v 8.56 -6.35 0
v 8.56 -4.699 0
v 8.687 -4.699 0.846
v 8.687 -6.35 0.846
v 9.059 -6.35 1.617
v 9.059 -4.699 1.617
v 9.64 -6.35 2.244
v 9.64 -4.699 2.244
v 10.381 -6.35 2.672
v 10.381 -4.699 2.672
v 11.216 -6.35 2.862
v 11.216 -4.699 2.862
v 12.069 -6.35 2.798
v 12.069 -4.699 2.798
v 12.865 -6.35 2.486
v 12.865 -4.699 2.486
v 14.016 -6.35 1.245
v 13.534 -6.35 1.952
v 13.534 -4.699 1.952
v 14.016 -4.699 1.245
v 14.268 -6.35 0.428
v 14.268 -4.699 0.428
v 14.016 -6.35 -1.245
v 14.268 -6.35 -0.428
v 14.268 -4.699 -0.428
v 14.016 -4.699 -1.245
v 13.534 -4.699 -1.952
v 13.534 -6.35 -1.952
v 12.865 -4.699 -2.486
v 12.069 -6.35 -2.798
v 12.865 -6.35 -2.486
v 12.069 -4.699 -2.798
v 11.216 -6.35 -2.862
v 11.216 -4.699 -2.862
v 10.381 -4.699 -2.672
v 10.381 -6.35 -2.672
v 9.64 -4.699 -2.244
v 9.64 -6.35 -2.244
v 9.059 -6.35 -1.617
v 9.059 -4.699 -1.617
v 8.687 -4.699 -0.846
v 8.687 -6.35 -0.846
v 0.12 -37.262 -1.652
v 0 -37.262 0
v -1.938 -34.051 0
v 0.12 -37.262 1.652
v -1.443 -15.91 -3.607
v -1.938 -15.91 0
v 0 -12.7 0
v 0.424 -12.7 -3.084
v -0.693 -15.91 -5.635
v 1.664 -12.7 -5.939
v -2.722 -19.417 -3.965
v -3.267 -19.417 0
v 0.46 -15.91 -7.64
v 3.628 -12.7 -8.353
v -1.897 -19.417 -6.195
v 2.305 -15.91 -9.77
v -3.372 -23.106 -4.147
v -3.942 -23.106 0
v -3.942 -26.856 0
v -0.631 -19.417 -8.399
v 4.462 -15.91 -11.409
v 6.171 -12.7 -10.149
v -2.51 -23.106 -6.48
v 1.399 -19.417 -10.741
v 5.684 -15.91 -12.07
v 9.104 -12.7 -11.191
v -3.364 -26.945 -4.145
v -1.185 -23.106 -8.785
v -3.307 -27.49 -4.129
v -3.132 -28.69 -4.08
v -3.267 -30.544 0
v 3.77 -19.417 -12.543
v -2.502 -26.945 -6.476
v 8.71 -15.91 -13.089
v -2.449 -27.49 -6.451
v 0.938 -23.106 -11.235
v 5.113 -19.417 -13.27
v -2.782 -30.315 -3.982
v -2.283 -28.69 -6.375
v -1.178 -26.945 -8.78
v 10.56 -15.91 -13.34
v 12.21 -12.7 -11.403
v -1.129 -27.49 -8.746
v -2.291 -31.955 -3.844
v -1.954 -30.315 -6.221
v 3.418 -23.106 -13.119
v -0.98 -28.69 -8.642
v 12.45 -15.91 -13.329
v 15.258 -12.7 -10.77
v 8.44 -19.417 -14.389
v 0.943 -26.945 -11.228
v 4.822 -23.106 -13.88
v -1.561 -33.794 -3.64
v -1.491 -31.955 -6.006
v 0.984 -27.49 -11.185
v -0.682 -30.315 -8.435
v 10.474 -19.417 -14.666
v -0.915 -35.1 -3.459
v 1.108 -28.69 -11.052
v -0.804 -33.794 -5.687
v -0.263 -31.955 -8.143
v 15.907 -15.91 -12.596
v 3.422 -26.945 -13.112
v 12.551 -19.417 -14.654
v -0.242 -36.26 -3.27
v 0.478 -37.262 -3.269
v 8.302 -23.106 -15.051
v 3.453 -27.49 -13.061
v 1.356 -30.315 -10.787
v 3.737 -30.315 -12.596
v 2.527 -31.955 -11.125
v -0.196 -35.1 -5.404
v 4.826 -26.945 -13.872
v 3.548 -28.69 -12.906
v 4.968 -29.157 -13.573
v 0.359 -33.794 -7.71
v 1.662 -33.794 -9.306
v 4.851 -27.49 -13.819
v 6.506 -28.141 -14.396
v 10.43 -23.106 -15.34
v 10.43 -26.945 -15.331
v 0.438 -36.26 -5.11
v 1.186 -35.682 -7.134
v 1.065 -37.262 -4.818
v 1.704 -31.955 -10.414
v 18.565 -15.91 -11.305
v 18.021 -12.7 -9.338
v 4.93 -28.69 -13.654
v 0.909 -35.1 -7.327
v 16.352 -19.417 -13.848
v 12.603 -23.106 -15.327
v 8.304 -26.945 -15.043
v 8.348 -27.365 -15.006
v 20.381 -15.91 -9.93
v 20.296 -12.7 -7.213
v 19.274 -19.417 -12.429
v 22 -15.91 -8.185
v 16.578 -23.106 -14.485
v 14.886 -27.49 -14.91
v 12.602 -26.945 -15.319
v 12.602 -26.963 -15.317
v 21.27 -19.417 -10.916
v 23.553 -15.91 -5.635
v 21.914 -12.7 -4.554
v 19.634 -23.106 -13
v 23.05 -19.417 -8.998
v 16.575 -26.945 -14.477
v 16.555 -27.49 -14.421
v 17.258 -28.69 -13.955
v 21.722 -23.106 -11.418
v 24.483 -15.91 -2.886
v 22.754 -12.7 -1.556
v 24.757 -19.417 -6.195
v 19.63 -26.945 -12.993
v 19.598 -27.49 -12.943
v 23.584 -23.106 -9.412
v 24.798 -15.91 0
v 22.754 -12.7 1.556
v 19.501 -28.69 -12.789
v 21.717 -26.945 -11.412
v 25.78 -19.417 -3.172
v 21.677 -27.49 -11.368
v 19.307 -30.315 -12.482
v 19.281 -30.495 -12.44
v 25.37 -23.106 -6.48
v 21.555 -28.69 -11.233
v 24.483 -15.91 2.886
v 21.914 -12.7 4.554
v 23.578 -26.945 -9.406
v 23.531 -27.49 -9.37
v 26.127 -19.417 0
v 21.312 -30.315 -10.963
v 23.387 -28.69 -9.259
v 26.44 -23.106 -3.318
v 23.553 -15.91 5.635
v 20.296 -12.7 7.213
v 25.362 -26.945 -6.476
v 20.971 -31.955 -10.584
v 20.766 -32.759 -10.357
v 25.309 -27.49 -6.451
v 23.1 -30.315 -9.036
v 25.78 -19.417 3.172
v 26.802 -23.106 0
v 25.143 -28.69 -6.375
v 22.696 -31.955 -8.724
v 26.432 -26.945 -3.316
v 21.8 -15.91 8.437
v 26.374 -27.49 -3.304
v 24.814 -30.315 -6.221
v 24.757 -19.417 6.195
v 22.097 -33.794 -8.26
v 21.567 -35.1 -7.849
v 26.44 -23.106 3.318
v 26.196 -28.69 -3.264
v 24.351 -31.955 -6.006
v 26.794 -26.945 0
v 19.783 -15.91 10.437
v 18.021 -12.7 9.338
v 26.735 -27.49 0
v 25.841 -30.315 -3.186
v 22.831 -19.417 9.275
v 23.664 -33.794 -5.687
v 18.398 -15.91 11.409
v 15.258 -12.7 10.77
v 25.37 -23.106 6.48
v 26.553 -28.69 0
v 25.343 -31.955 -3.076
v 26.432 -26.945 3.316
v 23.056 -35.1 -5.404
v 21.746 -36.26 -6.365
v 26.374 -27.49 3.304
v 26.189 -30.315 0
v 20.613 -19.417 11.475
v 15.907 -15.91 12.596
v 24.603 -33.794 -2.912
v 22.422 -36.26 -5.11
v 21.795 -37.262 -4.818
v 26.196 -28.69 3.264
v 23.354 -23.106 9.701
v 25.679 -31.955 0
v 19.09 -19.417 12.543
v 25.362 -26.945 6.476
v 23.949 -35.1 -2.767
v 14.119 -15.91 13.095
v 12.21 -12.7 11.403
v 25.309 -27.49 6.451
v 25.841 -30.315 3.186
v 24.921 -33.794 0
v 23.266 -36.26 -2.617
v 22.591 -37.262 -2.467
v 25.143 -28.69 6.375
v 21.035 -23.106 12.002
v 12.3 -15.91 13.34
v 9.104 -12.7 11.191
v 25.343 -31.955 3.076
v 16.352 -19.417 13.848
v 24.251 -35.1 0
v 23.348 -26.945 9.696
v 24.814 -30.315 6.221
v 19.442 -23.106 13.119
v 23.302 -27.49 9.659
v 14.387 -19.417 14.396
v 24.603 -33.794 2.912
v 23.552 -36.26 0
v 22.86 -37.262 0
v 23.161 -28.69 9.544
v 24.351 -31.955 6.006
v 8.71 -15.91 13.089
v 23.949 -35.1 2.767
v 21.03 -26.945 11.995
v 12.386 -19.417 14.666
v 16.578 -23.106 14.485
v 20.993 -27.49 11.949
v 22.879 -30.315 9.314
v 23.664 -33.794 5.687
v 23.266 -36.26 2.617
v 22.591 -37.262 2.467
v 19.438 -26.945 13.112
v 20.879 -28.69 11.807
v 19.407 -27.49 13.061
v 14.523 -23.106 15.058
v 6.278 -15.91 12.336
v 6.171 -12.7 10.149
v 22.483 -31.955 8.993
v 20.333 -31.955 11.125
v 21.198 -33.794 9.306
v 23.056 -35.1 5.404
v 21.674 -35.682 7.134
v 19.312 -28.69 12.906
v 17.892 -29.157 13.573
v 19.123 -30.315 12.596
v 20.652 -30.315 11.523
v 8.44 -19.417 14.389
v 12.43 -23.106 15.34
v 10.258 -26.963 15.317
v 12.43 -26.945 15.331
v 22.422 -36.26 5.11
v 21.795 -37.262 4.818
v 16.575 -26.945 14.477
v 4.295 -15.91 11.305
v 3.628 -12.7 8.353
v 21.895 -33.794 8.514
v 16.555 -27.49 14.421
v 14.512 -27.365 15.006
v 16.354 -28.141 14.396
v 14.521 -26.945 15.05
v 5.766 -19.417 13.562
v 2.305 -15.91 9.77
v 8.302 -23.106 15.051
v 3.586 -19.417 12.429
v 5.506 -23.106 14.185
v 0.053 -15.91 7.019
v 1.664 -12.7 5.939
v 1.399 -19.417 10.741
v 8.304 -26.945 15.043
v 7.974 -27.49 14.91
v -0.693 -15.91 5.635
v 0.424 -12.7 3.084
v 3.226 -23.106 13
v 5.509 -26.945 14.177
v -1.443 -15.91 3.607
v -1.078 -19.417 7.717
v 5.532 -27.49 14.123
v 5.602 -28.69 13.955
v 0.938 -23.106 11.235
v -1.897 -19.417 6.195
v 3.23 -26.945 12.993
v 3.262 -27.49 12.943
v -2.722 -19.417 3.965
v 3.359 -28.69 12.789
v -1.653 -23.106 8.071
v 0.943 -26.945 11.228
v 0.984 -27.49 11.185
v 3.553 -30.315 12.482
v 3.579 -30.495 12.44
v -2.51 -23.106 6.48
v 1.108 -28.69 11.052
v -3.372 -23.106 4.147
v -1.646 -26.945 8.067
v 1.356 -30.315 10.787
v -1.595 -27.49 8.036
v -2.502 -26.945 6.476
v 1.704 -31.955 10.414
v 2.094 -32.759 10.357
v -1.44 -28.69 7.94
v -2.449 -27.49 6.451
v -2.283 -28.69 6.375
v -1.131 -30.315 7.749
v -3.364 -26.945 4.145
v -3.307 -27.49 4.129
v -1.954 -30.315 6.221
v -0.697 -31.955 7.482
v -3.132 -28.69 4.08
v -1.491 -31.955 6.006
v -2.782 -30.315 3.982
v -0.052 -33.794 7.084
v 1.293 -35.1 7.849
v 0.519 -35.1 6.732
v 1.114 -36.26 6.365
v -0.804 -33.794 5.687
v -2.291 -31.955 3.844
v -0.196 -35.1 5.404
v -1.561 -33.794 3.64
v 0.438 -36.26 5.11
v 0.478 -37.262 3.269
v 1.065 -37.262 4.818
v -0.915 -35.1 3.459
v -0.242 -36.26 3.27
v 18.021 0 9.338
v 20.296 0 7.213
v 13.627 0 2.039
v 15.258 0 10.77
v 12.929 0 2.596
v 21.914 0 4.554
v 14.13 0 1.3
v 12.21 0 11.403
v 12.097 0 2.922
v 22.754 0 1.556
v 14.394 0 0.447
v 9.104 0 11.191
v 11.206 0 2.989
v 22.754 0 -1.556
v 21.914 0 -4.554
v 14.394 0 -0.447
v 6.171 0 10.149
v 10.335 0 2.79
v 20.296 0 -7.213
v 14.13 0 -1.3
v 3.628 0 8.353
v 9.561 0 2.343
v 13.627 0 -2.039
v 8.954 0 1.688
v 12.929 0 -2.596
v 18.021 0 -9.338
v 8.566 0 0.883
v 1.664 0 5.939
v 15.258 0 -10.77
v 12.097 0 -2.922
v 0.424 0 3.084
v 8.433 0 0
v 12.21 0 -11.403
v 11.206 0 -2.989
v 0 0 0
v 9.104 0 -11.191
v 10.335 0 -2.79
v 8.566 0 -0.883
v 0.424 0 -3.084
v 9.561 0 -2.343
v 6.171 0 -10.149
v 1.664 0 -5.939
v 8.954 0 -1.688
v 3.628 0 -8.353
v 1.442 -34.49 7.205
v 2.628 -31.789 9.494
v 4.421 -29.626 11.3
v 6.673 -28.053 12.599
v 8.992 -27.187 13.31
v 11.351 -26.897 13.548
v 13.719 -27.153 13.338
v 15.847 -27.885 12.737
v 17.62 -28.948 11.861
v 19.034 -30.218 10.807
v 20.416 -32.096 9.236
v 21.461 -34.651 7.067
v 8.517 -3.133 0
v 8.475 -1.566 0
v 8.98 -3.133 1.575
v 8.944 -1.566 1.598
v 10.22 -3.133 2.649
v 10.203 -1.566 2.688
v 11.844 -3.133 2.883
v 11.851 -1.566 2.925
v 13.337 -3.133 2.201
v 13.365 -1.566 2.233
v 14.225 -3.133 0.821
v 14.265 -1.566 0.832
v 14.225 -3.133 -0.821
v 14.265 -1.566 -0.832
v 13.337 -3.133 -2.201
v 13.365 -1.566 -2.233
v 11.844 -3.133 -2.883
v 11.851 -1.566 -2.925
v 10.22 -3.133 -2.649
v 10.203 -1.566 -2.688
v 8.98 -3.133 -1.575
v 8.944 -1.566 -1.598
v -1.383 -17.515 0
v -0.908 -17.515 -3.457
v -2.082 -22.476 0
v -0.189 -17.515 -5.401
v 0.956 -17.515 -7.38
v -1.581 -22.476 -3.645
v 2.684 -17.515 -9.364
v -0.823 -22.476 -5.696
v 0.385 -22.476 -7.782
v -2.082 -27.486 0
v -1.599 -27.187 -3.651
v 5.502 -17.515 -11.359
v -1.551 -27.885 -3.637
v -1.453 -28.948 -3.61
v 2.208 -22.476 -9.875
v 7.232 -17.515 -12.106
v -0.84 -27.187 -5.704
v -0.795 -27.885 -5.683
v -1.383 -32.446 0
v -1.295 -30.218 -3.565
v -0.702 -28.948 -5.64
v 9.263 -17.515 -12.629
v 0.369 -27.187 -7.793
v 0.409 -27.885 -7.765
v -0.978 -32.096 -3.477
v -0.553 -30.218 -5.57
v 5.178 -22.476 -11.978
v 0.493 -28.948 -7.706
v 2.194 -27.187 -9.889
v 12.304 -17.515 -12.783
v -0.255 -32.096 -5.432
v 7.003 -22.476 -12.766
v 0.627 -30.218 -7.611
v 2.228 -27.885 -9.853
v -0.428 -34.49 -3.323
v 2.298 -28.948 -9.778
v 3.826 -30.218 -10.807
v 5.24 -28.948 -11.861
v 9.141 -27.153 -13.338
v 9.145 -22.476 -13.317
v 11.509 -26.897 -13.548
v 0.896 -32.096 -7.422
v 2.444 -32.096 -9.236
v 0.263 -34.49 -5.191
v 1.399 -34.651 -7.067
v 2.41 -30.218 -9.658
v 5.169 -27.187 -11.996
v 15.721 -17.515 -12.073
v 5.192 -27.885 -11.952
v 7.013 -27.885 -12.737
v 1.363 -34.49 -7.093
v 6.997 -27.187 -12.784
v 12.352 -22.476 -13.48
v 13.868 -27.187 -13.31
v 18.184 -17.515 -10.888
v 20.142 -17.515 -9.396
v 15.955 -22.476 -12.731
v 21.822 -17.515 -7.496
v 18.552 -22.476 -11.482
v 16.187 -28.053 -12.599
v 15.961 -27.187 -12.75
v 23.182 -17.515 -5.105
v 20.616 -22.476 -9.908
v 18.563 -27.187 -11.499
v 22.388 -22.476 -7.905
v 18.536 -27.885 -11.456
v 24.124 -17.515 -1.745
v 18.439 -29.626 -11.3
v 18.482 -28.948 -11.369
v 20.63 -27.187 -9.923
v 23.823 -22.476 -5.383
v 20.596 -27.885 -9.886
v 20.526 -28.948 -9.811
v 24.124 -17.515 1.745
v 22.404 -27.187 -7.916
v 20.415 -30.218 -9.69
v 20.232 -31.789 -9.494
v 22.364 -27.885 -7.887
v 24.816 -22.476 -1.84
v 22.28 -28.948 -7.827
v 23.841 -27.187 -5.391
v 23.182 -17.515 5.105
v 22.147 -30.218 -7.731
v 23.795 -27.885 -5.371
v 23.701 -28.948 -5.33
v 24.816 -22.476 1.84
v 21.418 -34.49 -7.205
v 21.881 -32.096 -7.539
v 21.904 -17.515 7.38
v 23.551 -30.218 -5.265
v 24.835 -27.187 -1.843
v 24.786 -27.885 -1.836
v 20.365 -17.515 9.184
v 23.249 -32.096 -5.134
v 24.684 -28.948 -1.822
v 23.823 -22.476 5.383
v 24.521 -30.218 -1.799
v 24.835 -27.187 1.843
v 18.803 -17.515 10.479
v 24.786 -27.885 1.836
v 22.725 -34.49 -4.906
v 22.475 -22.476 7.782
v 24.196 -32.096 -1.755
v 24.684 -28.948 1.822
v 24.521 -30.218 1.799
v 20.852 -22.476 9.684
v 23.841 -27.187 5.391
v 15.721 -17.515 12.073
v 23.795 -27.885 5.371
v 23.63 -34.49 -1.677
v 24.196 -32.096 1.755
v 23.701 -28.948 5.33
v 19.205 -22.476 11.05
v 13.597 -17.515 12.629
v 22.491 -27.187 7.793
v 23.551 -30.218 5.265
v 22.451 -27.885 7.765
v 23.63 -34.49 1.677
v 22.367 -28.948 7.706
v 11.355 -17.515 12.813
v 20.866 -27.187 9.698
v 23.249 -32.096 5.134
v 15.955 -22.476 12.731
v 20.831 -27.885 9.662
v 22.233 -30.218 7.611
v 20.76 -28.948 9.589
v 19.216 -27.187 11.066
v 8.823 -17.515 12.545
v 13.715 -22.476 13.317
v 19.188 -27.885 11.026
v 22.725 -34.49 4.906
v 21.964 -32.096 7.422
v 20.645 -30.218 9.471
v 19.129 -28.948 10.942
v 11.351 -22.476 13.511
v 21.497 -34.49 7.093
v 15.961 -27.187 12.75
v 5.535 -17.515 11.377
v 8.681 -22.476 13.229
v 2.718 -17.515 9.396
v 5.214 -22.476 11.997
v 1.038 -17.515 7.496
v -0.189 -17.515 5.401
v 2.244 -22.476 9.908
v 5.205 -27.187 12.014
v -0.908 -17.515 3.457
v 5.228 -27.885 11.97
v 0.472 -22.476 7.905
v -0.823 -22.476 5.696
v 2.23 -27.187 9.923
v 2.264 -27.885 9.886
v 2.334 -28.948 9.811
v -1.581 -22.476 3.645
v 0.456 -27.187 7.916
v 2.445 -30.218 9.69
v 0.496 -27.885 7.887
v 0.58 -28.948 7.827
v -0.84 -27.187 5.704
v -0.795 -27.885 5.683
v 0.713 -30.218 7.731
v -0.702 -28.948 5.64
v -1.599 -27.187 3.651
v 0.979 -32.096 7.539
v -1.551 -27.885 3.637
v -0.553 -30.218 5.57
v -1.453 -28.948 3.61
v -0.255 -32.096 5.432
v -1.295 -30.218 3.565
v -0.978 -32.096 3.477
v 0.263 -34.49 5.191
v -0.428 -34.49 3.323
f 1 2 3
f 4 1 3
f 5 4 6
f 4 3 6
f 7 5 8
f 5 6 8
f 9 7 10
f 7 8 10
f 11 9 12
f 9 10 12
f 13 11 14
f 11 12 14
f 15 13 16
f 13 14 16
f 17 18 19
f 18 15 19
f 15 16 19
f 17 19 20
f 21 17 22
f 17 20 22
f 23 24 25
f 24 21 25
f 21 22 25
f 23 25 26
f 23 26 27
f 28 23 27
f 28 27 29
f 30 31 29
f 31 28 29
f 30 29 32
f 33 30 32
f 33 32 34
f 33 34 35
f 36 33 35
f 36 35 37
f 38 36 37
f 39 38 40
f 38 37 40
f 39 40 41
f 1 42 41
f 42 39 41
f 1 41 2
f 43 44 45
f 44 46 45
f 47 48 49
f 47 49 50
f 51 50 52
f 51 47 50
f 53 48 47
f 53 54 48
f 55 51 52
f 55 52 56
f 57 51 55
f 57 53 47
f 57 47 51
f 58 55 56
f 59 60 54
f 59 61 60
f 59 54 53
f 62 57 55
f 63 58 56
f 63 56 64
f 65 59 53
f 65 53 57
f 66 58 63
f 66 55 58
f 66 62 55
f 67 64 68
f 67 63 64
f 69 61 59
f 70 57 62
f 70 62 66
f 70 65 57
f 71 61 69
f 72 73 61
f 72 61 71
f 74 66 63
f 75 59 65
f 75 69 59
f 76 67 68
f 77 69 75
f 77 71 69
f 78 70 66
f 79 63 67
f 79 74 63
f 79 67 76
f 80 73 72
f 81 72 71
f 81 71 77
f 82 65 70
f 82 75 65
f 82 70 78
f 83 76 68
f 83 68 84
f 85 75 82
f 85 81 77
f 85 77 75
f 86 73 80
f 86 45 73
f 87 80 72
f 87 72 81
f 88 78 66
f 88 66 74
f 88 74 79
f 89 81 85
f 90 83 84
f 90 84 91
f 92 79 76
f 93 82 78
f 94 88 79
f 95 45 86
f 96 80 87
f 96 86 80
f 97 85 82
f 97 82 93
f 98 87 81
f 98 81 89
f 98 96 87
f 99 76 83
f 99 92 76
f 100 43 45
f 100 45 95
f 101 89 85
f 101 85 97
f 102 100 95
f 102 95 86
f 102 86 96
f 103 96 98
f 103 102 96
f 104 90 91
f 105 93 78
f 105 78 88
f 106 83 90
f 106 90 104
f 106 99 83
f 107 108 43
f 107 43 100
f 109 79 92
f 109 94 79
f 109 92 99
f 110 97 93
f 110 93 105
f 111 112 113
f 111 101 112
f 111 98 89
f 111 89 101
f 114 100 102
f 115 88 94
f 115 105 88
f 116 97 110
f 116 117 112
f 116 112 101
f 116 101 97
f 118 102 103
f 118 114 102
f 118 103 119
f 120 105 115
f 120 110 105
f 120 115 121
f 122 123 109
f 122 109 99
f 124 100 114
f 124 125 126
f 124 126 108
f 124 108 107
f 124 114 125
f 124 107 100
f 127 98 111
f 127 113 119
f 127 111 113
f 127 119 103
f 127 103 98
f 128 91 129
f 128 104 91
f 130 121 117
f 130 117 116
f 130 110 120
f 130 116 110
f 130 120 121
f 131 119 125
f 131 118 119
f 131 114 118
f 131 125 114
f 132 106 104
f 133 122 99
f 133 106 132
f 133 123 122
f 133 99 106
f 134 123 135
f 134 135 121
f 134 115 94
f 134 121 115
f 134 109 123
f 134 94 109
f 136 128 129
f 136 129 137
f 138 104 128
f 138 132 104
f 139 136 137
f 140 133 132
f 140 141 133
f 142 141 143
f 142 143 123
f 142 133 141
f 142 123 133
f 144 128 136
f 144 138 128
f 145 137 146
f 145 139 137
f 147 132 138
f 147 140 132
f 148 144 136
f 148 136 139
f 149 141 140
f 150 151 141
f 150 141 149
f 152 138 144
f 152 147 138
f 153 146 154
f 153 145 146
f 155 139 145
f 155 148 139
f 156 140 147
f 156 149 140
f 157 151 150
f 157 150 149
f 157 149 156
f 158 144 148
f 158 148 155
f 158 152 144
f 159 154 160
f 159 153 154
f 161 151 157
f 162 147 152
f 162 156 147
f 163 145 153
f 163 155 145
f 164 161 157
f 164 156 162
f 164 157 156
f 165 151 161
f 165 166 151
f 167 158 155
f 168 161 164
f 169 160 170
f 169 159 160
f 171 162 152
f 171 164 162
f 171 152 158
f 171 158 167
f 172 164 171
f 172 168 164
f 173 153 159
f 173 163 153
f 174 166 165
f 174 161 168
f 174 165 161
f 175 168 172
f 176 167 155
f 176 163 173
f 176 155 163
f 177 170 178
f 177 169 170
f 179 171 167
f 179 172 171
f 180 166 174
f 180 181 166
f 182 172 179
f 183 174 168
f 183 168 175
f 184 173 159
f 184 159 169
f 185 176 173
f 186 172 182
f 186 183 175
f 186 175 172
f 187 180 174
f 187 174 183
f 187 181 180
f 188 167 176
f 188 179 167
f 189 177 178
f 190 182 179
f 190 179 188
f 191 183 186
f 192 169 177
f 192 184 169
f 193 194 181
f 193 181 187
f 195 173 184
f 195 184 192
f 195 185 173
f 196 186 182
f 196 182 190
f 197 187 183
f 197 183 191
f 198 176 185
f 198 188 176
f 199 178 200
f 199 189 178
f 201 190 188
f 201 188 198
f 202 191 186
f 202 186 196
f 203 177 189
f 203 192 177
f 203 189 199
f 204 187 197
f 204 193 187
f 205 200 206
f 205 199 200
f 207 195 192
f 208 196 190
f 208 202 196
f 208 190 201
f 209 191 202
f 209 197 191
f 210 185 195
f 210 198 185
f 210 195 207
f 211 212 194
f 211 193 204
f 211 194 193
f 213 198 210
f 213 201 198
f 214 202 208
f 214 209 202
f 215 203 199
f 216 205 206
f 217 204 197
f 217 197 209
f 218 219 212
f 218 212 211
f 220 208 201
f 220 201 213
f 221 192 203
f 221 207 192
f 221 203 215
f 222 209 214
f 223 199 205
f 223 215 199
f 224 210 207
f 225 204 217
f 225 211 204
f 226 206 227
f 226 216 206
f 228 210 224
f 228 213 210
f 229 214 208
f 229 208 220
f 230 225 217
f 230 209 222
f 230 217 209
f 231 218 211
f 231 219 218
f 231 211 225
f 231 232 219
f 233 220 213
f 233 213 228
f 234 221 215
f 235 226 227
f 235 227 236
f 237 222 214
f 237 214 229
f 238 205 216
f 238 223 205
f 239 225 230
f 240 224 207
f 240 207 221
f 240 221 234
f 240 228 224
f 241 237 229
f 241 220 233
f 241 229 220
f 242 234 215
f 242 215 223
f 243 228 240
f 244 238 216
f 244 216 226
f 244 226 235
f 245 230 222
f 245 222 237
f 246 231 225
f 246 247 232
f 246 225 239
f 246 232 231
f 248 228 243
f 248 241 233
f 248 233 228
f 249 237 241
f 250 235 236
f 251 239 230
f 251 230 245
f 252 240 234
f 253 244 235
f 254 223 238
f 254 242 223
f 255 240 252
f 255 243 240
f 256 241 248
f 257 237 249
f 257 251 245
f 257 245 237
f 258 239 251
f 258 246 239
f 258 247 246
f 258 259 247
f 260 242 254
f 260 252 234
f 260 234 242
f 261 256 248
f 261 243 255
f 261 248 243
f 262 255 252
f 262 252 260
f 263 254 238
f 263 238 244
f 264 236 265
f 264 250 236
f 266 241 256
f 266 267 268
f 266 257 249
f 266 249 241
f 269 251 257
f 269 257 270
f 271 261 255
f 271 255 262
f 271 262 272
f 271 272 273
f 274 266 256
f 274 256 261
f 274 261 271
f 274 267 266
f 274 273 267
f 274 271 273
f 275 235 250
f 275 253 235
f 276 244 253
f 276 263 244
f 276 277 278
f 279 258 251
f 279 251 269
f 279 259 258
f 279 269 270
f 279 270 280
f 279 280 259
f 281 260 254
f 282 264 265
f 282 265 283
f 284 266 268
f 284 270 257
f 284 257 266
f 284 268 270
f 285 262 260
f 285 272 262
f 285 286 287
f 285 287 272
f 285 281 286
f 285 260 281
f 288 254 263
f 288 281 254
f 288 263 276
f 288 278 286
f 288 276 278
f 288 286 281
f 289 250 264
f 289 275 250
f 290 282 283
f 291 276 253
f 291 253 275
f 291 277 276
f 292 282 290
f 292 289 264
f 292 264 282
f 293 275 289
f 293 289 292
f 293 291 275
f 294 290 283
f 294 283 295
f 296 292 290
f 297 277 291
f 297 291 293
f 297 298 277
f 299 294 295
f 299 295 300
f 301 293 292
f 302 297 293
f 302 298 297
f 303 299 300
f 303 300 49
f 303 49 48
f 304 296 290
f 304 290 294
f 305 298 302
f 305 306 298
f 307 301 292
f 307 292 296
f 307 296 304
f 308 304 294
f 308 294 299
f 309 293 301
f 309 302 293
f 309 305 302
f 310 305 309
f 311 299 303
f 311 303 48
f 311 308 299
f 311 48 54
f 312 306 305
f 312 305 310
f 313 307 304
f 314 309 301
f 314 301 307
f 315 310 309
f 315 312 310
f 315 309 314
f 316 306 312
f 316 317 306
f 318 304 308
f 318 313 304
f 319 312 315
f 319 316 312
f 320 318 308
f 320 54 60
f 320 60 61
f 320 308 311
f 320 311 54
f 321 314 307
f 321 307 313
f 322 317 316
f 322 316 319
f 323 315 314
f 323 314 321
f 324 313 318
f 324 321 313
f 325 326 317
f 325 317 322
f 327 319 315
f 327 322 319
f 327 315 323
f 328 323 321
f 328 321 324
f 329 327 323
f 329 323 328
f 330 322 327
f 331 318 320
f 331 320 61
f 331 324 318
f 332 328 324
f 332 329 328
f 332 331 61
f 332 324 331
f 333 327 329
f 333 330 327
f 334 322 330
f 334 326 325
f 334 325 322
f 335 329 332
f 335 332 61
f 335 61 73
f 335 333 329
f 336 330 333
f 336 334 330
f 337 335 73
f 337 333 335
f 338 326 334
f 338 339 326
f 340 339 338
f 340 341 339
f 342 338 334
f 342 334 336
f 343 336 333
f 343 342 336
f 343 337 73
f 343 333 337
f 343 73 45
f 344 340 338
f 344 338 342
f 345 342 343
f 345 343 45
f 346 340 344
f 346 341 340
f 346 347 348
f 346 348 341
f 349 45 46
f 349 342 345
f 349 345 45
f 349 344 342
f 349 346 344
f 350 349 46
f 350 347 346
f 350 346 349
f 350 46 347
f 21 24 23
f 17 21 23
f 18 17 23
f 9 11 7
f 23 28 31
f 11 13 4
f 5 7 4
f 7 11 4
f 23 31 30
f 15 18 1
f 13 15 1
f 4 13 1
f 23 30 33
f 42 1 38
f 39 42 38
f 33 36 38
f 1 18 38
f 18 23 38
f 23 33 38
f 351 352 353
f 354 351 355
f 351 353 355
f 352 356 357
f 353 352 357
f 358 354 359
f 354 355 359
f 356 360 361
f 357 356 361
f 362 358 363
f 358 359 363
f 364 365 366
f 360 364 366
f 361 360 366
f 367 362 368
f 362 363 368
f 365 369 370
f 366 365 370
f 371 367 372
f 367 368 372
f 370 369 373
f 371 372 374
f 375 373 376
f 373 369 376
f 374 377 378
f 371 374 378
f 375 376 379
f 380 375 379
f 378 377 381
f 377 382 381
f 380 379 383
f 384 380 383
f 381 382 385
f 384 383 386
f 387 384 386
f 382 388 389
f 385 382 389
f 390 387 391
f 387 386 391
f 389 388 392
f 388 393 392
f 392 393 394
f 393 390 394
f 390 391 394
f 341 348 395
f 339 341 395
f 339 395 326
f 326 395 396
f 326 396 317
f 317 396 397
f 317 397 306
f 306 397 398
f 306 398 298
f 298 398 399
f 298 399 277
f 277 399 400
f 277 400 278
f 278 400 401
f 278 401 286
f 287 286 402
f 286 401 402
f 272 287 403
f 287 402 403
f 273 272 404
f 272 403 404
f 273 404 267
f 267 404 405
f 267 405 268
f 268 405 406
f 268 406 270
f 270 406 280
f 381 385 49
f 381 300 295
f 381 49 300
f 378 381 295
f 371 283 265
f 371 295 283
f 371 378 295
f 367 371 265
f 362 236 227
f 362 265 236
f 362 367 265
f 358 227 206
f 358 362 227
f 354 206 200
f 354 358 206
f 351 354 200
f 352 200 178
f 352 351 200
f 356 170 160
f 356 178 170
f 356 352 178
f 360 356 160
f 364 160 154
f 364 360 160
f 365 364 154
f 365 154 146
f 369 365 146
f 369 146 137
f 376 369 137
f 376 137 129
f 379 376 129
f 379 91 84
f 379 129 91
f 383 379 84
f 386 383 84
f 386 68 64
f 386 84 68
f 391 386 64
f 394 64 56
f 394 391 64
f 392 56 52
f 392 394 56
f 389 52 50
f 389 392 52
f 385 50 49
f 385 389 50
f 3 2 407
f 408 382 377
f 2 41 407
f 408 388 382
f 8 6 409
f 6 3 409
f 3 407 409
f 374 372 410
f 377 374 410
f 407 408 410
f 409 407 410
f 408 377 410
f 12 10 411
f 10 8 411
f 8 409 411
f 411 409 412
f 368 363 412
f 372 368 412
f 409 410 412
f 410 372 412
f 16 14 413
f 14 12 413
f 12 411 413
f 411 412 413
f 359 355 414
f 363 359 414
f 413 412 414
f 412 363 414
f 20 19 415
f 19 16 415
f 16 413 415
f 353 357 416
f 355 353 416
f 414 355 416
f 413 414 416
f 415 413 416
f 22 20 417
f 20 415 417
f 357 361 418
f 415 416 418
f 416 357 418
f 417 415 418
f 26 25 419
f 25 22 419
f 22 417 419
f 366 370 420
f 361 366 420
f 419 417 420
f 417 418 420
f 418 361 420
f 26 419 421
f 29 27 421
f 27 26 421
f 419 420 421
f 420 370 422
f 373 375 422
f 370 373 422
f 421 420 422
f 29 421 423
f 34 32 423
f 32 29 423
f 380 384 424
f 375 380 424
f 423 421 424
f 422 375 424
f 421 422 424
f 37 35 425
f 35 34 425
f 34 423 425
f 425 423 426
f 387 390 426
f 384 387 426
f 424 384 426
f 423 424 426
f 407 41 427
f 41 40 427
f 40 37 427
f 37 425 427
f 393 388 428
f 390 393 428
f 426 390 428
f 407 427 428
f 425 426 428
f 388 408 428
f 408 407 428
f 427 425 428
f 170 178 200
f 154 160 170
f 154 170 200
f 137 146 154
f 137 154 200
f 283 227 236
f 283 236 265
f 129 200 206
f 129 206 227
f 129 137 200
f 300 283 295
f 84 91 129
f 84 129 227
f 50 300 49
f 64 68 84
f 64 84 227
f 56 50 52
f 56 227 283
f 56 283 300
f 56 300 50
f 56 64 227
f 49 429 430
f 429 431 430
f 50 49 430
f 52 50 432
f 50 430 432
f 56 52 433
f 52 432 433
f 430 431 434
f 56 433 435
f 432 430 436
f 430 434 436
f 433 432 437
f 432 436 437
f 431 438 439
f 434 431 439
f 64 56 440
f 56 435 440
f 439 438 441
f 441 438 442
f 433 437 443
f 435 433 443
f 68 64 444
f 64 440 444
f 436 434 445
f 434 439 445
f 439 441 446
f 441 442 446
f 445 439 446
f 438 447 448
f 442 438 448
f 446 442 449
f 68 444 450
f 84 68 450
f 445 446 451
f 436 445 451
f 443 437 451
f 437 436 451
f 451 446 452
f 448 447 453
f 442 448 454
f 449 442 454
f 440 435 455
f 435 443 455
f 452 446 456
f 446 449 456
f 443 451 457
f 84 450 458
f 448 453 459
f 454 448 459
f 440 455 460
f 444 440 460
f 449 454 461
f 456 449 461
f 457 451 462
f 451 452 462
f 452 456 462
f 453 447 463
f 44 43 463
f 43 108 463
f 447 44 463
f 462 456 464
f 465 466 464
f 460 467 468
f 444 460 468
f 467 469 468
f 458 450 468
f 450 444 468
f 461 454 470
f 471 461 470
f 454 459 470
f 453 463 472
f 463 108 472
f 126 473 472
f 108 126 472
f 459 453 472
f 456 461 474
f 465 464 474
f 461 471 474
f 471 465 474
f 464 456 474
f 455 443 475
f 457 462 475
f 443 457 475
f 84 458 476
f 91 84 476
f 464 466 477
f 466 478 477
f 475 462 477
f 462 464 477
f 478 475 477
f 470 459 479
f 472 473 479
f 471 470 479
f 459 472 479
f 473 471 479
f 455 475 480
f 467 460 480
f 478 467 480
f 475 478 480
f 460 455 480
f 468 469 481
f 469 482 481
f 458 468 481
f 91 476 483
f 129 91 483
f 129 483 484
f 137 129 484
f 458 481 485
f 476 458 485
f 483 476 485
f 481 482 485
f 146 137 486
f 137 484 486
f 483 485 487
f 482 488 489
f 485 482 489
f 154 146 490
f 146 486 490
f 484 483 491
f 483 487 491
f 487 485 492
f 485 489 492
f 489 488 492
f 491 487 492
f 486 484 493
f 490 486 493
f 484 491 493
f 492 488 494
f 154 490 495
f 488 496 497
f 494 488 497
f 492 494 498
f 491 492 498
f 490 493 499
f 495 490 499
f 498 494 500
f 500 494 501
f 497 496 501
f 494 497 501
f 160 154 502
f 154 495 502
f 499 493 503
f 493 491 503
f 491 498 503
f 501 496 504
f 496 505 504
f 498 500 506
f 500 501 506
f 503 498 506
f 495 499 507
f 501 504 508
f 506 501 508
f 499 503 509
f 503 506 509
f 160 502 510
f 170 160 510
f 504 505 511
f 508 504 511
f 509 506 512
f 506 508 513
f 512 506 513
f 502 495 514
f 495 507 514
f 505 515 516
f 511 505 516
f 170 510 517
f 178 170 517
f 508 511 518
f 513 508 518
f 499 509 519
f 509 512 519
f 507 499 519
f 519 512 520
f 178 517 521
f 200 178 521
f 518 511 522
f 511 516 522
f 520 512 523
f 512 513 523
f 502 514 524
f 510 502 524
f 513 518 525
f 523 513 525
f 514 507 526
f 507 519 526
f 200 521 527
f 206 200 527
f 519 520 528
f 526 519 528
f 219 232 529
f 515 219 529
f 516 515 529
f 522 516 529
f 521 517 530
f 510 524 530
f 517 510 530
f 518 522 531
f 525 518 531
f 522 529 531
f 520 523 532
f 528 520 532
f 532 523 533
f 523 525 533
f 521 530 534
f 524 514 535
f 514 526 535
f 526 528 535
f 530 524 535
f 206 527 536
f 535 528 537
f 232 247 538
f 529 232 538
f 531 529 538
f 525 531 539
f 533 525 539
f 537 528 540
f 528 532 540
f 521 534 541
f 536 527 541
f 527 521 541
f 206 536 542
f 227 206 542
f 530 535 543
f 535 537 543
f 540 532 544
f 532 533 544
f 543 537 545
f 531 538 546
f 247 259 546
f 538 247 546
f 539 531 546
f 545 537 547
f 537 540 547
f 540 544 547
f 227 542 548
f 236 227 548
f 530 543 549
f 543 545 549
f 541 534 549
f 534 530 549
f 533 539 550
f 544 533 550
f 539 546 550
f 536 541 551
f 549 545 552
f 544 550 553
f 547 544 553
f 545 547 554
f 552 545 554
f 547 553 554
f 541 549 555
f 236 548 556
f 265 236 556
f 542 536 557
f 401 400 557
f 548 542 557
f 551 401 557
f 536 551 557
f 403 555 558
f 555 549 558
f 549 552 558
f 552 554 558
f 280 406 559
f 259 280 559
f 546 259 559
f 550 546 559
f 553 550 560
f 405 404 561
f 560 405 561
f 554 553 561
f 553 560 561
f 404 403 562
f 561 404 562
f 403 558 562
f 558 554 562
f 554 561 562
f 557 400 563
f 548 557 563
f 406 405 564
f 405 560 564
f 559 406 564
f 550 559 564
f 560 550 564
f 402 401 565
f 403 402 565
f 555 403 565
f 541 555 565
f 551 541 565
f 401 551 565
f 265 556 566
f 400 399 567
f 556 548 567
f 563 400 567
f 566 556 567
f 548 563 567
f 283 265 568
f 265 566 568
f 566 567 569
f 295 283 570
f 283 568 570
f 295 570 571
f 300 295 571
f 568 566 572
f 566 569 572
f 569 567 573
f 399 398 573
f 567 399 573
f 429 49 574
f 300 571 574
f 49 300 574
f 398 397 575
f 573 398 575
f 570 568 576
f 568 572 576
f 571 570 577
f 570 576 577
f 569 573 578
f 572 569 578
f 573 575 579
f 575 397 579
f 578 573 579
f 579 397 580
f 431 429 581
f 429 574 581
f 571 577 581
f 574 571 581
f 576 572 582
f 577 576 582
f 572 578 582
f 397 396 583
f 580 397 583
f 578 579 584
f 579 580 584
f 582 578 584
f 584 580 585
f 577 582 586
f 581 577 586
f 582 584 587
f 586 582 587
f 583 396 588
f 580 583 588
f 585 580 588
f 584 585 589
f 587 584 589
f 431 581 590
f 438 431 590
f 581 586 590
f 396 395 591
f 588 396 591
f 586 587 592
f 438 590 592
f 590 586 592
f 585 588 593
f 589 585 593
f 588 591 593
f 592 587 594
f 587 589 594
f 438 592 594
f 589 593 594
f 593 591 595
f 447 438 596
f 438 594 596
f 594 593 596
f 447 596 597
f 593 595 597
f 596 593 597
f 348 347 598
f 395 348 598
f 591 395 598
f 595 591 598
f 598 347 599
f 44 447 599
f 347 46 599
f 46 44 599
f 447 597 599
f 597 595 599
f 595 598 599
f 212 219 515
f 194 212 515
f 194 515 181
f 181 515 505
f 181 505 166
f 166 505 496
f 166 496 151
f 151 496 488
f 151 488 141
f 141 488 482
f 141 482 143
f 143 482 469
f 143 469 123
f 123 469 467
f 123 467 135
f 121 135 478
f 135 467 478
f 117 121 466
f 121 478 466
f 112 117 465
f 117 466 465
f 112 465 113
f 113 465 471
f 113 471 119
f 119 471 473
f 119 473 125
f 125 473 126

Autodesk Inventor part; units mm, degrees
ref_plane "YZ Plane" through (0, 0, 0) normal (1, 0, 0) x (0, 1, 0)
ref_plane "XZ Plane" through (0, 0, 0) normal (0, 1, 0) x (-1, 0, 0)
sketch "Sketch1" plane through (0, 0, 0) normal (0, 0, 1) x (1, 0, 0)
  line L0 (0, 0) -> (11.43, 0)
  line L1 (11.43, 0) -> (11.43, -12.7)
  line L2 (11.43, -12.7) -> (0, -12.7)
  line L3 (0, -12.7) -> (0, 0)
  line L4 (11.43, 0) -> (11.43, -54.8894) construction
  arc A0 (0, -12.7) -> (0, -37.2615) centre (16.7117, -24.9808) ccw
  arc A1 (0, -12.7) -> (0, -37.2615) centre (33.6789, -24.9808) ccw
  dimension "d2" = 16.9672
  dimension "d3" = 12.7
  dimension "d16" = 11.43
  dimension "d17" = 54.8894
revolve "Revolution1" add sketch "Sketch1" angle 360 about axis through (11.43, 0, 0) along (0, -1, 0)
sketch "Sketch2" plane through (0, 0, 0) normal (0, 0, 1) x (1, 0, 0)
  line L0 (22.86, 0) -> (0, 0) projected
  line L1 (11.43, 0) -> (8.4328, 0)
  line L2 (11.43, 0) -> (11.43, -6.35)
  line L3 (11.43, -6.35) -> (8.5598, -6.35)
  line L4 (8.5598, -6.35) -> (8.5598, -4.699)
  line L5 (8.5598, -4.699) -> (8.4328, 0)
  dimension "d7" = 2.9972
  dimension "d8" = 6.35
  dimension "d9" = 2.8702
  dimension "d12" = 1.651
revolve "Revolution2" cut sketch "Sketch2" angle 360 about axis through (11.43, 0, 0) along (0, -1, 0)
sketch "Sketch3" plane through (0, 0, 0) normal (0, 0, 1) x (1, 0, 0)
  line L0 (22.86, -37.2615) -> (0, -37.2615) projected
  circle A0 centre (11.43, -37.2615) radius 10.3649
  point P0 (0, 0)
extrude "Extrusion1" cut sketch "Sketch3" along normal mid plane 635
sketch "Sketch4" plane through (0, 0, 0) normal (0, 0, 1) x (1, 0, 0)
  point P0 (0, 0)
sketch "Sketch5" plane through (11.43, 0, 0) normal (0, 1, 0) x (1, 0, 0)
  point P0 (-11.43, 0)
properties part number "caster holder jeffreys"
